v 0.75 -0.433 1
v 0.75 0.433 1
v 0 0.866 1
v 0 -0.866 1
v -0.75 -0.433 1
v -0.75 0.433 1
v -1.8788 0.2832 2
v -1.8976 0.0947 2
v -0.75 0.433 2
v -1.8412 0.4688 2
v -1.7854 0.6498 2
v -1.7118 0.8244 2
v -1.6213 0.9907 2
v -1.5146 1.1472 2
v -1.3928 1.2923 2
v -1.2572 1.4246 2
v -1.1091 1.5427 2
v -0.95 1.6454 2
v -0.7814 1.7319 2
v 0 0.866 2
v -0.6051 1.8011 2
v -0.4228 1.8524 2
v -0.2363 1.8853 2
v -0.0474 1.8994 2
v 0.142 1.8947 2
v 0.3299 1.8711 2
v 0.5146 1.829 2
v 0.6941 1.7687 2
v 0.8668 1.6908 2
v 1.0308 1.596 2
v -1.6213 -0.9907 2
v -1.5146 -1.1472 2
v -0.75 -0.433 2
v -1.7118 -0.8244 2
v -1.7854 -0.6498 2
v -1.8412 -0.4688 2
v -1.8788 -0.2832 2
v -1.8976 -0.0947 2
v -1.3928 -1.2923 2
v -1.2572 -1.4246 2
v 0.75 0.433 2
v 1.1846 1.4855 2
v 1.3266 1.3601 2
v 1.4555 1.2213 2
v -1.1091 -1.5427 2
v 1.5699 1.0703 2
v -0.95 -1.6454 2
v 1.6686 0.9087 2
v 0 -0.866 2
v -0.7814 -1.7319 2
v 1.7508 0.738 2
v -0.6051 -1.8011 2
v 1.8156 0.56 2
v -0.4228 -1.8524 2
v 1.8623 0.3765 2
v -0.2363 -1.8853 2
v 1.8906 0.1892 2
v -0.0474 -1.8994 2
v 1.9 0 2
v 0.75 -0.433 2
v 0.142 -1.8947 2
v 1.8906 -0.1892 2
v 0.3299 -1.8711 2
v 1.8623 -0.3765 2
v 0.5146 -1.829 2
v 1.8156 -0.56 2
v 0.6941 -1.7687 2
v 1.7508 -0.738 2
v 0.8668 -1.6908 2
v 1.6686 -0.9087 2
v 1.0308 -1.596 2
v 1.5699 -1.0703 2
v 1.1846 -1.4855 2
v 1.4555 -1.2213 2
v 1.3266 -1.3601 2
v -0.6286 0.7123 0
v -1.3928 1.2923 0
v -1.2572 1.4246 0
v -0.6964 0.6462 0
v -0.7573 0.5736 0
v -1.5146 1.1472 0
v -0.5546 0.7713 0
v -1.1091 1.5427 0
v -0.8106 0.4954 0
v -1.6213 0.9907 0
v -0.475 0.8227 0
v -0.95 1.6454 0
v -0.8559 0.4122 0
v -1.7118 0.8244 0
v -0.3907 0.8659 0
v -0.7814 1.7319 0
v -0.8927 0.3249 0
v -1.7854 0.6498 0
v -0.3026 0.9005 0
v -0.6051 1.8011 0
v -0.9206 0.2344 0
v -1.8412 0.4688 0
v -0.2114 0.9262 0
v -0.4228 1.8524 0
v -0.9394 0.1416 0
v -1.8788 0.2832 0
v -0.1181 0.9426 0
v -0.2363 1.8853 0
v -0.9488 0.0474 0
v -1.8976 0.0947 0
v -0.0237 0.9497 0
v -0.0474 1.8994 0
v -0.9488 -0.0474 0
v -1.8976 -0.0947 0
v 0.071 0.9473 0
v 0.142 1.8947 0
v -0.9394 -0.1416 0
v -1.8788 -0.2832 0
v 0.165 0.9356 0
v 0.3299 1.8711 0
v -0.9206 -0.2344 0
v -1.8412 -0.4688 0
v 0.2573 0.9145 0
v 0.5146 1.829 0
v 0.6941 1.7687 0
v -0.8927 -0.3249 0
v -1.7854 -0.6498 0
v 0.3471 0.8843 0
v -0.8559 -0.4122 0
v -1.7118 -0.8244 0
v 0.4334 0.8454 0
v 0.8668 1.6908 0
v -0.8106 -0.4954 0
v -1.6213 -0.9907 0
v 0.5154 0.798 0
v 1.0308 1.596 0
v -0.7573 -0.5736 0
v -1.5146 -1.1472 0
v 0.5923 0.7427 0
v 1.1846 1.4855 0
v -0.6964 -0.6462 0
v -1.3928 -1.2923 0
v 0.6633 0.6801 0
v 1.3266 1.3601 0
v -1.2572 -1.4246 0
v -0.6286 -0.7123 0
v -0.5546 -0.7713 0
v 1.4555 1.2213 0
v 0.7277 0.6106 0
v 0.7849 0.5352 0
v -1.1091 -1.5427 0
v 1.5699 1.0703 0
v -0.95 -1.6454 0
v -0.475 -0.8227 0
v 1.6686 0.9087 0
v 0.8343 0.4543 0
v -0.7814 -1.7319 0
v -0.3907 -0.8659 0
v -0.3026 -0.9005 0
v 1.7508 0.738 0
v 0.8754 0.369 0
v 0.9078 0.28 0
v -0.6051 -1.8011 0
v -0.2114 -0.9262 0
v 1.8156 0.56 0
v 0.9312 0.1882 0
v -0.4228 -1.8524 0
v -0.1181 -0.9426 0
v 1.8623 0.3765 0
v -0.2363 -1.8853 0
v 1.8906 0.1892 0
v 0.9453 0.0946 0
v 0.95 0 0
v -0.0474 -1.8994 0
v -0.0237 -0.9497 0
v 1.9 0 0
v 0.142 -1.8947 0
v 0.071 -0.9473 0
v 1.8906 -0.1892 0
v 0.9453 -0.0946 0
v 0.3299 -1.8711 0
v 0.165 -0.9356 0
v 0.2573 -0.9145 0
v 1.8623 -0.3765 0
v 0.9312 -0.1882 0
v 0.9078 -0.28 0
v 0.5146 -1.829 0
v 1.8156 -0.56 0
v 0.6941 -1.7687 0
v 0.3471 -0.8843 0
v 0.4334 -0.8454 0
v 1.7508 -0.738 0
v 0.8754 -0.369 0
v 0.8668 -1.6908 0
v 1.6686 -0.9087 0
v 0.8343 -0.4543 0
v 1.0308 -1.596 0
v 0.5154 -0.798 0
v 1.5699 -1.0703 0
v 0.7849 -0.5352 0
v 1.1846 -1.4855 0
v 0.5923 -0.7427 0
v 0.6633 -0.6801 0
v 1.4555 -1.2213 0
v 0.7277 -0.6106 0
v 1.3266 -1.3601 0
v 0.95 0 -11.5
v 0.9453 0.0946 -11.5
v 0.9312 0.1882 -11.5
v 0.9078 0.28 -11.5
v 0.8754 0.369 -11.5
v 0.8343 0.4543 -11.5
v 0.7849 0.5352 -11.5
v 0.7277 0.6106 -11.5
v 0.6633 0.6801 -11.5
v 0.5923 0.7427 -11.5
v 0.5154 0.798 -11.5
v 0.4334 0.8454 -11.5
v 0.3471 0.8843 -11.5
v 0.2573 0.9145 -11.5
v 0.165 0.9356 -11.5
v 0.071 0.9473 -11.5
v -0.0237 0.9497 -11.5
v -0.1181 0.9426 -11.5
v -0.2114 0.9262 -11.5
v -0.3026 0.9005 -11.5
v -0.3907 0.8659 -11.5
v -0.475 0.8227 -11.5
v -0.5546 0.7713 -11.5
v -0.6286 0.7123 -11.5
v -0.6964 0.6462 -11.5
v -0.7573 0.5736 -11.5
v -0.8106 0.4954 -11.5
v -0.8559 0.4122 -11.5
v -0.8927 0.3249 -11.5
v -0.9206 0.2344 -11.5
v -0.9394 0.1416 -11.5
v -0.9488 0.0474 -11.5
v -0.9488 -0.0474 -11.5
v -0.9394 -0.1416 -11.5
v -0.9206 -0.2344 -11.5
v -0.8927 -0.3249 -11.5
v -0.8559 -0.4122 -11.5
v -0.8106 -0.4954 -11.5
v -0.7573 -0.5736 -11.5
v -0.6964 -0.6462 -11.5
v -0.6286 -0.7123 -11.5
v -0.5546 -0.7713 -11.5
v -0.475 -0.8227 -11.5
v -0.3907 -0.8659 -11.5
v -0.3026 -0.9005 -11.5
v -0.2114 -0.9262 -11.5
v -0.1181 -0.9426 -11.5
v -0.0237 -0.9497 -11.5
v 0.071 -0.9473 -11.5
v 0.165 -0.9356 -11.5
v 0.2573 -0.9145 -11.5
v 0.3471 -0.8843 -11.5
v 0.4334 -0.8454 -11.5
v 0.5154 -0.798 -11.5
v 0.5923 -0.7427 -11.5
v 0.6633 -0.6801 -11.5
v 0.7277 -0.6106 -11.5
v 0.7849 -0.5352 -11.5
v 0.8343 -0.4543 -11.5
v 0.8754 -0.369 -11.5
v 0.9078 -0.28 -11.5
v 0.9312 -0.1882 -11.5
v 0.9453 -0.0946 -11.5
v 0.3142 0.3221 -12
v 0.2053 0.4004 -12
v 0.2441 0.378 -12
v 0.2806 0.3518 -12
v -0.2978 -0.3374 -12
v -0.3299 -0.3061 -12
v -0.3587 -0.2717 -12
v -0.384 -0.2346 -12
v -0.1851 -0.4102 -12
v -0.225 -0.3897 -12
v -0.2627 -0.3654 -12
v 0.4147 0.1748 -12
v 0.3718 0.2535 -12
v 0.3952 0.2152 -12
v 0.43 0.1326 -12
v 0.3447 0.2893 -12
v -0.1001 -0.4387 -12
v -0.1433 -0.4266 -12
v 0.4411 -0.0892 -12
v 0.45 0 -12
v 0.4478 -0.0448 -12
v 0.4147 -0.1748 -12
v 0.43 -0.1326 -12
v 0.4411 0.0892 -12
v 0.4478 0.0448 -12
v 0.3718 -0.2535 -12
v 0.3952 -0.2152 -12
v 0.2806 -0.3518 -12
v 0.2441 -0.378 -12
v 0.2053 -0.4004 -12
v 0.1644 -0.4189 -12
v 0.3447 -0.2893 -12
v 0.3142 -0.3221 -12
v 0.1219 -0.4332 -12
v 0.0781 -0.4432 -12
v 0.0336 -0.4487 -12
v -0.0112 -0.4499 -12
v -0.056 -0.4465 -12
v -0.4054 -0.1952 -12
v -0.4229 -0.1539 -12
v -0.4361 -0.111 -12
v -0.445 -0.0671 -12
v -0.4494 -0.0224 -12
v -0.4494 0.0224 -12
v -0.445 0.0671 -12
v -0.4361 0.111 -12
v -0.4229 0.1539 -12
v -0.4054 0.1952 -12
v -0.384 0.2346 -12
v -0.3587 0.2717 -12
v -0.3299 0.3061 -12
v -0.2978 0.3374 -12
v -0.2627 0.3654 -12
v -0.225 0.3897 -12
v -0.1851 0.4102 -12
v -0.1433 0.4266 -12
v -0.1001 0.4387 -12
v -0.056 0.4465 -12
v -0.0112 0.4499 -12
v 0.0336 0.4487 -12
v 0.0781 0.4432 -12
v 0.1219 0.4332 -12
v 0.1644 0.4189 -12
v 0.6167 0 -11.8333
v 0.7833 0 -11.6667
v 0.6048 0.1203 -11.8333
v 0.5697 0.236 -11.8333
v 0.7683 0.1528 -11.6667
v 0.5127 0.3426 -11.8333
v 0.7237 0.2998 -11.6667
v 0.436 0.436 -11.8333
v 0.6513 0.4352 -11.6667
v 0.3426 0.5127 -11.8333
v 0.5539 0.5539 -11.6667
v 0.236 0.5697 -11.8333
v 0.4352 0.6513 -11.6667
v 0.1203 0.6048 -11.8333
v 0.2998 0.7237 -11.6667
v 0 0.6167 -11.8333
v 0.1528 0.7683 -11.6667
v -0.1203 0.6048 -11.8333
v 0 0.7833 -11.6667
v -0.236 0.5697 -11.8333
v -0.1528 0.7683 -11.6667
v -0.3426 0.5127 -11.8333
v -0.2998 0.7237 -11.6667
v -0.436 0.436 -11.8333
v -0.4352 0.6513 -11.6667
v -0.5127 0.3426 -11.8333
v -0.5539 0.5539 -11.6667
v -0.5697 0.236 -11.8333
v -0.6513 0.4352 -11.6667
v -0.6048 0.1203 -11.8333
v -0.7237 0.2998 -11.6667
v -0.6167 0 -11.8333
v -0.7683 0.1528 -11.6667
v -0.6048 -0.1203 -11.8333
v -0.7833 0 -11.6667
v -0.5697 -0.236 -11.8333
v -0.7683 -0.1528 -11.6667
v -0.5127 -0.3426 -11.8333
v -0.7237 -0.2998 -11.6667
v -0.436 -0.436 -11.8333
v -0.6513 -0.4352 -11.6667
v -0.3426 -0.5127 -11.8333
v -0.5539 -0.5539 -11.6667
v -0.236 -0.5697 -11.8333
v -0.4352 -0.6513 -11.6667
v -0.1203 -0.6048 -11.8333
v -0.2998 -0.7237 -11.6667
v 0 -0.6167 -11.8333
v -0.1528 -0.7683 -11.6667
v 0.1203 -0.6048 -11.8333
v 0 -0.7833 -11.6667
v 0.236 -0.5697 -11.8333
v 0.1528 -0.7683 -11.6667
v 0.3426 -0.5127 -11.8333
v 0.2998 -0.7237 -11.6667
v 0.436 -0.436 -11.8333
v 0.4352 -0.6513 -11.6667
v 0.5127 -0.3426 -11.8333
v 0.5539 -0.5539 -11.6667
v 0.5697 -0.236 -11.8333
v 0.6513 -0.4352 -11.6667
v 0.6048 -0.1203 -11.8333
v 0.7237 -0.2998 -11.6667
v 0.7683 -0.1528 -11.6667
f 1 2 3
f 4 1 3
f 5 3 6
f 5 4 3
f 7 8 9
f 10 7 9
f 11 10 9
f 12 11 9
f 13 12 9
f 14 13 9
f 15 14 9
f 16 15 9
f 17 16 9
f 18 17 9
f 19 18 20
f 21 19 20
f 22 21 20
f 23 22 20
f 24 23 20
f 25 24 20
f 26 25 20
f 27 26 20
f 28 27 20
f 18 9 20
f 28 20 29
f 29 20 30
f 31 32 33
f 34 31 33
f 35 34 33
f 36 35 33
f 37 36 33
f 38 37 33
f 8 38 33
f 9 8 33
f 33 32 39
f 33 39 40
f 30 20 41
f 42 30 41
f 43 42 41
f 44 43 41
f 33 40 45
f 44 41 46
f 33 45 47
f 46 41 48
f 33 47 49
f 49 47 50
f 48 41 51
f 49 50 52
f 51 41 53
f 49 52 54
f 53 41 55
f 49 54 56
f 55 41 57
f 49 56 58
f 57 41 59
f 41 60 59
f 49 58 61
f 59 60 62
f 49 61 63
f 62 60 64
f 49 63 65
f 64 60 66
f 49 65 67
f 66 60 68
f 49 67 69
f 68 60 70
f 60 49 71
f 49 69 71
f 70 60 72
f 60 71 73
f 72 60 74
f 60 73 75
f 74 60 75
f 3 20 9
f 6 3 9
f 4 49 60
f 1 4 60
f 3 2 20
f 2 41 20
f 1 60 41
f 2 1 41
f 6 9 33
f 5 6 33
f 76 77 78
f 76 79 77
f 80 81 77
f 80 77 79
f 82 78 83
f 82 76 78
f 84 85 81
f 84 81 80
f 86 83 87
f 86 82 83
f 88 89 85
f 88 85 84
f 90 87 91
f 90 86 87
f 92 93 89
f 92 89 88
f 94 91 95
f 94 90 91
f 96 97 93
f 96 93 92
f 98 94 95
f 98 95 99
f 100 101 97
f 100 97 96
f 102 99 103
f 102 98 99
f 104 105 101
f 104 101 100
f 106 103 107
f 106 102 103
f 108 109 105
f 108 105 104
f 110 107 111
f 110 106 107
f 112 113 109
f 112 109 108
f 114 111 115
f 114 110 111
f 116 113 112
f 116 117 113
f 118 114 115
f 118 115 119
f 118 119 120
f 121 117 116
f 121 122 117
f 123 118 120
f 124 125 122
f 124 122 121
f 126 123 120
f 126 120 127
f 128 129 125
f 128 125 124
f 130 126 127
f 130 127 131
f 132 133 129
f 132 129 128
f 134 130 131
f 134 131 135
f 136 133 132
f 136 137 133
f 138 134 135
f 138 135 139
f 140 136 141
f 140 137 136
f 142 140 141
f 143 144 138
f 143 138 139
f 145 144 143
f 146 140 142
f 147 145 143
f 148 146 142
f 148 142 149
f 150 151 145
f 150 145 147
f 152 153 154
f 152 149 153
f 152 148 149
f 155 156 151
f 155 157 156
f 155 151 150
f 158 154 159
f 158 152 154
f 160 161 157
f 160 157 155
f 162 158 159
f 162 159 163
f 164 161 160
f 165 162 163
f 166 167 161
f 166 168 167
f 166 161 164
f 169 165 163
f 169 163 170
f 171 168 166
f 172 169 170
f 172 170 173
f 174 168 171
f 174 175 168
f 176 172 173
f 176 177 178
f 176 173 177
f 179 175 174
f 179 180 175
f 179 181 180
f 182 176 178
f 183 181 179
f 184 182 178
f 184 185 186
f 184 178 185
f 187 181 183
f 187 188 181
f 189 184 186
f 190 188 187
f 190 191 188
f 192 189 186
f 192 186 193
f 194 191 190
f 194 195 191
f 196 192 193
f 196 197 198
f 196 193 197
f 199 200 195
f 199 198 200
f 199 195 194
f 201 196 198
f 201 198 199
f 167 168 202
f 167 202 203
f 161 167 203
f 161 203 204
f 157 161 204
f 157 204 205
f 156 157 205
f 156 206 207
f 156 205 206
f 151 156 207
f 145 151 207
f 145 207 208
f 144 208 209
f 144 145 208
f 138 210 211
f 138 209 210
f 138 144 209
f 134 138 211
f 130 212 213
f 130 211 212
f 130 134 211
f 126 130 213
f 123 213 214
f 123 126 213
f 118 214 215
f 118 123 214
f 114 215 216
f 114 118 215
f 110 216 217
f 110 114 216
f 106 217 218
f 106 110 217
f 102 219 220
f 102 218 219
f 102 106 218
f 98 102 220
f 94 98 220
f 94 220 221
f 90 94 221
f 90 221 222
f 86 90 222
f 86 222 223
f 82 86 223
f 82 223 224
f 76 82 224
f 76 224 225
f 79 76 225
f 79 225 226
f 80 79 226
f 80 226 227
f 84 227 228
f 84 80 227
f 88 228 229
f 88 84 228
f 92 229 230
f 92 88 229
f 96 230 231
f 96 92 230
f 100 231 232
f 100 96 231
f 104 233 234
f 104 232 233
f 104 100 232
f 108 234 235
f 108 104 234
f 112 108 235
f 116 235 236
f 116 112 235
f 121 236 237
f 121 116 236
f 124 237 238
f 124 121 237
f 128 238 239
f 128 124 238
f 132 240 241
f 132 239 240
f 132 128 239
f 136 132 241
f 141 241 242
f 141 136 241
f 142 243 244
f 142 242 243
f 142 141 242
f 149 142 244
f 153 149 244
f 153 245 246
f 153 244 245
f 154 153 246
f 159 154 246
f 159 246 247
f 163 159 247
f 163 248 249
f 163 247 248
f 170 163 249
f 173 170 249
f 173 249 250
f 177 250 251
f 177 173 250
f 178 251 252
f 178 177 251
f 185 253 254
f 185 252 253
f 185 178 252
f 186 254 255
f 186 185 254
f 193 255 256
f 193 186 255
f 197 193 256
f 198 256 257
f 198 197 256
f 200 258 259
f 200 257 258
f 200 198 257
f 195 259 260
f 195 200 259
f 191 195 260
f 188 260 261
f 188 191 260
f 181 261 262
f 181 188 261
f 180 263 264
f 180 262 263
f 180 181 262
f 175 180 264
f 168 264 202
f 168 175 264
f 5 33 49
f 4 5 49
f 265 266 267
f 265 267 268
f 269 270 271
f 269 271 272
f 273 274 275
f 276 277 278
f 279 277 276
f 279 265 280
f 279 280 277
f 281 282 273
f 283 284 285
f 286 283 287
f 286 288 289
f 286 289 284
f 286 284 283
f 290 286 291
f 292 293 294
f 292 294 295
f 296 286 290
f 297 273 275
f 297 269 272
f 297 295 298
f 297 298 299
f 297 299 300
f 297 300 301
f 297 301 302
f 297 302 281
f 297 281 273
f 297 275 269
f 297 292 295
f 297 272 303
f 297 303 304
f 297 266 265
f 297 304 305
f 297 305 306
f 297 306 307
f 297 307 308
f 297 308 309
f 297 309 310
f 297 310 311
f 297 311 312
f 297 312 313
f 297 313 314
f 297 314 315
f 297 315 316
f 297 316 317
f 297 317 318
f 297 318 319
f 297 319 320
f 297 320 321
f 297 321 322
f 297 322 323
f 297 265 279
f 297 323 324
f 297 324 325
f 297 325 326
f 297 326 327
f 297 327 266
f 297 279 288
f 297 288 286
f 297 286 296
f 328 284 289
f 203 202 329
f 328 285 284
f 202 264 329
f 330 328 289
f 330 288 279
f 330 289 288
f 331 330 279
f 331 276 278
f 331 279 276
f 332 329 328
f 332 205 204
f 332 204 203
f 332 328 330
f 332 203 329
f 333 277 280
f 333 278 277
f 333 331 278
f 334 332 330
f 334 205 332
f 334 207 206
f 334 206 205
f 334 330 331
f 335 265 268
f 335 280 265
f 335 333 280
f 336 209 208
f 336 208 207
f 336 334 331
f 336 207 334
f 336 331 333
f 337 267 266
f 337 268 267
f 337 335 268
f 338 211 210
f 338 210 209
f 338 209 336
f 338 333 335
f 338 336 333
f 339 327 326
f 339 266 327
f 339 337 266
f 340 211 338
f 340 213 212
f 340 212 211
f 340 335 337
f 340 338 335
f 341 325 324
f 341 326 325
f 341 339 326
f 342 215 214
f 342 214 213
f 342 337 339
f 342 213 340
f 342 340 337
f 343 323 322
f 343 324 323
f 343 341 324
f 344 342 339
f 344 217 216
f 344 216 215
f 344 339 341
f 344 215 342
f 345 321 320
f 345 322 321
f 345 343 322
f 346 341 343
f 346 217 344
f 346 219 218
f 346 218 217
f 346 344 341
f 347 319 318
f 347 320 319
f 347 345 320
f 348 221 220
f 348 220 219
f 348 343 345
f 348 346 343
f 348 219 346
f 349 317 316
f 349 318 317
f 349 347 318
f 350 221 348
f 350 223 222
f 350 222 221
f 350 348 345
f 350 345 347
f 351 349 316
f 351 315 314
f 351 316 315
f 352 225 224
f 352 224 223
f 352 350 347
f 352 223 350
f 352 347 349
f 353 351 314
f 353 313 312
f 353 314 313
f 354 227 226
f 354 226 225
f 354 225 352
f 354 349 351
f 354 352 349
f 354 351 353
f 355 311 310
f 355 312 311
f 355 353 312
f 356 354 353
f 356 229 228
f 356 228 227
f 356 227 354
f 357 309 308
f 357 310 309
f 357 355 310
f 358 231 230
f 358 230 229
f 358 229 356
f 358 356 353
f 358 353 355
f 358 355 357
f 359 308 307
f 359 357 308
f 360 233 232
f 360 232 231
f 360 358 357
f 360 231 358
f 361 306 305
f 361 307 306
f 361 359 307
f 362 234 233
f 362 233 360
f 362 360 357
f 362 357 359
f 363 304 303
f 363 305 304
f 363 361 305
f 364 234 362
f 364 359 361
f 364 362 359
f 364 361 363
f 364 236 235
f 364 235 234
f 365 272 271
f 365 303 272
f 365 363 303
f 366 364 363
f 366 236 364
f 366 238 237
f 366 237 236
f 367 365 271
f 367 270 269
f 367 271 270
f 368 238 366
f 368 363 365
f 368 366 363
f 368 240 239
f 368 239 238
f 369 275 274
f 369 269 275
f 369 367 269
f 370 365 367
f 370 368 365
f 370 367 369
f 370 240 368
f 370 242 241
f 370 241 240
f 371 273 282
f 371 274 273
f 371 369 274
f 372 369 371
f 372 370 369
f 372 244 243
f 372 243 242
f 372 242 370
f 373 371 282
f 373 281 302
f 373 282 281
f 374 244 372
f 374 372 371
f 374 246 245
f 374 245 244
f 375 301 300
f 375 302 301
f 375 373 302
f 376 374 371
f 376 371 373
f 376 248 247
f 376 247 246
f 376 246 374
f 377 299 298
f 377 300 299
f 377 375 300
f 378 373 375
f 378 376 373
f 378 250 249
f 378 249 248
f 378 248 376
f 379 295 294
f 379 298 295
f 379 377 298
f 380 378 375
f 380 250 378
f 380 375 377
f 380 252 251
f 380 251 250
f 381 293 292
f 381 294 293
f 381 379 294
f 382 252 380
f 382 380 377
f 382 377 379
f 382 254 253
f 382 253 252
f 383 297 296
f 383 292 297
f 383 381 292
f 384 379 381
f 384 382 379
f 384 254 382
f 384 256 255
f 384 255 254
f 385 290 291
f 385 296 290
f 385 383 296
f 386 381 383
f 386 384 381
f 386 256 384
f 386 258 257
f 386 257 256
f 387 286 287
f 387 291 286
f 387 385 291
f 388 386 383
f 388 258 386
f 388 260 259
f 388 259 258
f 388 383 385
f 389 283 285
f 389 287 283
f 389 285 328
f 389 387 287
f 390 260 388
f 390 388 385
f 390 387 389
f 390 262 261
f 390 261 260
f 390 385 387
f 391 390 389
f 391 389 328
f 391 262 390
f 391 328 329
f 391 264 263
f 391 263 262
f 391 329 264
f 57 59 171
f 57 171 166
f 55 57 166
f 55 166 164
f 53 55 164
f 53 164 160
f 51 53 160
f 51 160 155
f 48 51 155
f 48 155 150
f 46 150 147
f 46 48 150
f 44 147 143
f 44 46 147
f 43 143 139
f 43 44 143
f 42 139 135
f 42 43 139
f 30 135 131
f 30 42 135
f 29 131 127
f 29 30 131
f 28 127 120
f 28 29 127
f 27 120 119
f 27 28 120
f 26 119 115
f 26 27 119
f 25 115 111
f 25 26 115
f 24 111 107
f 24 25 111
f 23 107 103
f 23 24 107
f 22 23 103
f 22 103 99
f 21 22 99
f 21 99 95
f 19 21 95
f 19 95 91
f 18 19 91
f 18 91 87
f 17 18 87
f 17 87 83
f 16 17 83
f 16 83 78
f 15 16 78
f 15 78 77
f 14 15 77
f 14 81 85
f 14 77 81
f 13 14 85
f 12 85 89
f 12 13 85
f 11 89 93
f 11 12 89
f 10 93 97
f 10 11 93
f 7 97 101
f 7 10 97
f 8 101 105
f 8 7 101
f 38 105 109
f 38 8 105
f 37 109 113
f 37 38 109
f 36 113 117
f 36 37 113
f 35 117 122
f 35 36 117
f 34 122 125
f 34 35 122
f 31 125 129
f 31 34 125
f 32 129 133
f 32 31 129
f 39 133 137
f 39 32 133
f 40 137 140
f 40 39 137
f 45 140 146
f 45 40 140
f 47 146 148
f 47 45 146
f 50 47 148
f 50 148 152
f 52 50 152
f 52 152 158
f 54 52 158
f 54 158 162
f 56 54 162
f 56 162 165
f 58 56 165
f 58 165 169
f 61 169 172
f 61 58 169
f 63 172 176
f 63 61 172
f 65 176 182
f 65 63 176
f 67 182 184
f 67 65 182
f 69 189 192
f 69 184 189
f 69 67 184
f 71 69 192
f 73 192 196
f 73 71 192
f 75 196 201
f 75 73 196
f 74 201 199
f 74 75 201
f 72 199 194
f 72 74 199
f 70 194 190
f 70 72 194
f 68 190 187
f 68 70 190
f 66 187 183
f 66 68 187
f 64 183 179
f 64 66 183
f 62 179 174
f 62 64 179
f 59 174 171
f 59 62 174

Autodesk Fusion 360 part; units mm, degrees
sketch "Sketch1" plane through (0, 0, 0) normal (0, 1, 0) x (1, 0, 0)
  line L0 (0, -1.5) -> (0, 14)
  line L1 (0, 14) -> (0.75, 14)
  line L2 (0.75, 14) -> (1.25, 13.5)
  line L3 (1.25, 13.5) -> (1.25, 0)
  line L4 (1.25, 0) -> (2.25, 0)
  line L5 (2.25, 0) -> (2.25, -0.4)
  line L6 (0, -1.5) -> (1, -1.5)
  arc A0 (1, -1.5) -> (2.25, -0.4) centre (0, 0.8966) ccw
  dimension "d1" = 14
  dimension "d2" = 1.5
  dimension "d3" = 1
  dimension "d4" = 0.4
  dimension "d5" = 2.25
  dimension "d6" = 1.25
  dimension "d7" = 45
  dimension "d8" = 0.5
revolve "Revolve1" add sketch "Sketch1" angle 360 about axis through (0, 0, 1.5) along (0, 0, -1)
sketch "Sketch2" plane through (0, 0, 1.5) normal (0, 0, 1) x (-1, 0, 0)
  circle A0 centre (0, 0) radius 1
  line L0 (-0.75, -0.433) -> (0, -0.866)
  line L1 (0, -0.866) -> (0.75, -0.433)
  line L2 (0.75, -0.433) -> (0.75, 0.433)
  line L3 (0.75, 0.433) -> (0, 0.866)
  line L4 (0, 0.866) -> (-0.75, 0.433)
  line L5 (-0.75, 0.433) -> (-0.75, -0.433)
  dimension "d10" = 1.5
extrude "Extrude1" cut sketch "Sketch2" against normal up to surface (2 mm away) contours L0 L1 L2 L3 L4 L5
equation "d5 = ( 4.5 / 2 ) * 1 mm"
equation "d6 = ( 2.5 / 2 ) * 1 mm"

Autodesk Fusion 360 part; units mm, degrees
sketch "Sketch1" plane through (0, 0, 0) normal (0, 1, 0) x (1, 0, 0)
  line L0 (0, -1.5) -> (0, 4)
  line L1 (0, 4) -> (0.75, 4)
  line L2 (0.75, 4) -> (1.25, 3.5)
  line L3 (1.25, 3.5) -> (1.25, 0)
  line L4 (1.25, 0) -> (2.25, 0)
  line L5 (2.25, 0) -> (2.25, -0.4)
  line L6 (0, -1.5) -> (1, -1.5)
  arc A0 (1, -1.5) -> (2.25, -0.4) centre (0, 0.8966) ccw
  dimension "d1" = 4
  dimension "d2" = 1.5
  dimension "d3" = 1
  dimension "d4" = 0.4
  dimension "d5" = 2.25
  dimension "d6" = 1.25
  dimension "d7" = 45
  dimension "d8" = 0.5
revolve "Revolve1" add sketch "Sketch1" angle 360 about axis through (0, 0, 1.5) along (0, 0, -1)
sketch "Sketch2" plane through (0, 0, 1.5) normal (0, 0, 1) x (-1, 0, 0)
  circle A0 centre (0, 0) radius 1
  line L0 (-0.75, -0.433) -> (0, -0.866)
  line L1 (0, -0.866) -> (0.75, -0.433)
  line L2 (0.75, -0.433) -> (0.75, 0.433)
  line L3 (0.75, 0.433) -> (0, 0.866)
  line L4 (0, 0.866) -> (-0.75, 0.433)
  line L5 (-0.75, 0.433) -> (-0.75, -0.433)
  dimension "d10" = 1.5
extrude "Extrude1" cut sketch "Sketch2" against normal up to surface (2 mm away) contours L0 L1 L2 L3 L4 L5
equation "d5 = ( 4.5 / 2 ) * 1 mm"
equation "d6 = ( 2.5 / 2 ) * 1 mm"

Autodesk Fusion 360 part; units mm, degrees
sketch "Sketch1" plane through (0, 0, 0) normal (0, 1, 0) x (1, 0, 0)
  line L0 (0, -2) -> (0, 12)
  line L1 (0, 12) -> (0.45, 12)
  line L2 (0.45, 12) -> (0.95, 11.5)
  line L3 (0.95, 11.5) -> (0.95, 0)
  line L4 (0.95, 0) -> (1.9, 0)
  line L5 (1.9, 0) -> (1.9, -2)
  line L6 (1.9, -2) -> (0, -2)
  dimension "d1" = 12
  dimension "d2" = 45
  dimension "d3" = 0.5
  dimension "d4" = 0.95
  dimension "d5" = 2
  dimension "d6" = 1.9
revolve "Revolve1" add sketch "Sketch1" angle 360 about axis through (0, 0, 2) along (0, 0, -1)
sketch "Sketch2" plane through (0, 0, 2) normal (0, 0, 1) x (-1, 0, 0)
  circle A0 centre (0, 0) radius 1.9
  line L0 (-0.75, -0.433) -> (0, -0.866)
  line L1 (0, -0.866) -> (0.75, -0.433)
  line L2 (0.75, -0.433) -> (0.75, 0.433)
  line L3 (0.75, 0.433) -> (0, 0.866)
  line L4 (0, 0.866) -> (-0.75, 0.433)
  line L5 (-0.75, 0.433) -> (-0.75, -0.433)
  dimension "d8" = 1.5
extrude "Extrude1" cut sketch "Sketch2" against normal blind 1 contours L0 L1 L2 L3 L4 L5
equation "d4 = ( 1.9 / 2 ) * 1 mm"
equation "d6 = ( 3.8 / 2 ) * 1 mm"
